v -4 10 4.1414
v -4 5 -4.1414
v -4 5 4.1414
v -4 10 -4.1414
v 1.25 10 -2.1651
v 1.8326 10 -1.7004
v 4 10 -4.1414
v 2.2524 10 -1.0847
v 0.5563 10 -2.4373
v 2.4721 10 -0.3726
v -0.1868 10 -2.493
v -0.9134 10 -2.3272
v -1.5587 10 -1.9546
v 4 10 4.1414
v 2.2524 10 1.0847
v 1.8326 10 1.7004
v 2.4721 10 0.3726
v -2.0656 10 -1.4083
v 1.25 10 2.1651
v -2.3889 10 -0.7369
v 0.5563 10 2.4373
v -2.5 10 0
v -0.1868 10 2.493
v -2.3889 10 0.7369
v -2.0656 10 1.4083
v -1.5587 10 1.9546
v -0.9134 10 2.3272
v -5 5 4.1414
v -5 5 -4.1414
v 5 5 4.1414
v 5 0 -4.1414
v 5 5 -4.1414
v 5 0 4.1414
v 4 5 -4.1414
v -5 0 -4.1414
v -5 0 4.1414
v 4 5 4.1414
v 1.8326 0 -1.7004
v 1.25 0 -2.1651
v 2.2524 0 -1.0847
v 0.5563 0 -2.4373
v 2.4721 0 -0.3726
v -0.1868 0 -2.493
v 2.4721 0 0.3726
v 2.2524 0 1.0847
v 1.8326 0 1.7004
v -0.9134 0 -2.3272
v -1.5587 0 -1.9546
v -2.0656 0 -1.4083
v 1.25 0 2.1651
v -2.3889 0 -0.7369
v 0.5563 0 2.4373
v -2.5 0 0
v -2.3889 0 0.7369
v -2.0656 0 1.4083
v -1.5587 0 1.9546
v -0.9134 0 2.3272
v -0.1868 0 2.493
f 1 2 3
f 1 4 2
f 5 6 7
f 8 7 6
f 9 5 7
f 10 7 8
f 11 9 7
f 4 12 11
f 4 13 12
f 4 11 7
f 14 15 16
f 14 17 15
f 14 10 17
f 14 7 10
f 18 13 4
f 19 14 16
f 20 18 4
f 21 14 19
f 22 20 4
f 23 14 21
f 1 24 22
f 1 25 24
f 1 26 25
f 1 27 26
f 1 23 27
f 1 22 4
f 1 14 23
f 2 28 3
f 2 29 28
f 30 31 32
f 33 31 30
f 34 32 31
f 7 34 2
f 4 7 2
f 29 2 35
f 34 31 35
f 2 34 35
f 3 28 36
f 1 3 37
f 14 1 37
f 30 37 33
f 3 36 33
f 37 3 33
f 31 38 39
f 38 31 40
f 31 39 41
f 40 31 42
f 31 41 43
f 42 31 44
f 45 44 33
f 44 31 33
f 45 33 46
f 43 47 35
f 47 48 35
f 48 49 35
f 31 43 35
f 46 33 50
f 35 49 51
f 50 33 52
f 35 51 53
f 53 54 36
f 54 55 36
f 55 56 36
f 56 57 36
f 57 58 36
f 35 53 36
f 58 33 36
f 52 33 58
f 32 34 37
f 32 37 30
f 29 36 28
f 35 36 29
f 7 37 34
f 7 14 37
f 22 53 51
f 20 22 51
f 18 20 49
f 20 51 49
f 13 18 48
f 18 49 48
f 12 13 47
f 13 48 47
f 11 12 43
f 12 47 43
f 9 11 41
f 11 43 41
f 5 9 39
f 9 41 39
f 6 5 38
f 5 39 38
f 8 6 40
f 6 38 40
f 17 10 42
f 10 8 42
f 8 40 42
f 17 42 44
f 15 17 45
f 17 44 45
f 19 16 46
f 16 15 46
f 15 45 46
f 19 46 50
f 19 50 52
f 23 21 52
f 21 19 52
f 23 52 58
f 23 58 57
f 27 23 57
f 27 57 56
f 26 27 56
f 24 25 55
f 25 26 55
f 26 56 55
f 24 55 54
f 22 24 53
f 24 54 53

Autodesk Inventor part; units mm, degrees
ref_plane "YZ Plane" through (0, 0, 0) normal (1, 0, 0) x (0, 1, 0)
ref_plane "XZ Plane" through (0, 0, 0) normal (0, 1, 0) x (-1, 0, 0)
ref_plane "XY Plane" through (0, 0, 0) normal (0, 0, 1) x (1, 0, 0)
sketch "Sketch2" plane through (0, 0, 0) normal (0, 1, 0) x (-1, 0, 0)
  line L0 (-5, 5) -> (5, 5)
  line L1 (5, 5) -> (5, -5)
  line L2 (5, -5) -> (-5, -5)
  line L3 (-5, -5) -> (-5, 5)
  line L4 (-5, 5) -> (5, -5) construction
  line L5 (5, 5) -> (-5, -5) construction
  circle A0 centre (0, 0) radius 2.5
  line L6 (5, 4.1414) -> (-5, 4.1414)
  line L7 (-5, -4.1414) -> (5, -4.1414)
  point P0 (5, -4.1414)
  dimension "d0" = 10
  dimension "d1" = 10
  dimension "d2" = 5
  dimension "d5" = 180
extrude "Extrusion1" add sketch "Sketch2" along normal blind 10 contours L6 L1 L7 L3
sketch "Sketch3" plane through (0, 10, 0) normal (0, 1, 0) x (1, 0, 0)
  line L0 (5, 4.1414) -> (-5, 4.1414) projected
  line L1 (-5, -4.1414) -> (5, -4.1414) projected
  line L2 (-5, 4.1414) -> (-4, 4.1414)
  line L3 (-4, 4.1414) -> (-4, -4.1414)
  line L4 (-4, -4.1414) -> (-5, -4.1414)
  line L5 (-5, -4.1414) -> (-5, 4.1414)
  line L6 (5, -4.1414) -> (4, -4.1414)
  line L7 (4, -4.1414) -> (4, 4.1414)
  line L8 (4, 4.1414) -> (5, 4.1414)
  line L9 (5, 4.1414) -> (5, -4.1414)
  point P0 (0, 0)
  dimension "d9" = 1
  dimension "d12" = 180
extrude "Extrusion2" cut sketch "Sketch3" against normal blind 5 contours L9 L1 L7 L0 | L3 L1 L5 L0
